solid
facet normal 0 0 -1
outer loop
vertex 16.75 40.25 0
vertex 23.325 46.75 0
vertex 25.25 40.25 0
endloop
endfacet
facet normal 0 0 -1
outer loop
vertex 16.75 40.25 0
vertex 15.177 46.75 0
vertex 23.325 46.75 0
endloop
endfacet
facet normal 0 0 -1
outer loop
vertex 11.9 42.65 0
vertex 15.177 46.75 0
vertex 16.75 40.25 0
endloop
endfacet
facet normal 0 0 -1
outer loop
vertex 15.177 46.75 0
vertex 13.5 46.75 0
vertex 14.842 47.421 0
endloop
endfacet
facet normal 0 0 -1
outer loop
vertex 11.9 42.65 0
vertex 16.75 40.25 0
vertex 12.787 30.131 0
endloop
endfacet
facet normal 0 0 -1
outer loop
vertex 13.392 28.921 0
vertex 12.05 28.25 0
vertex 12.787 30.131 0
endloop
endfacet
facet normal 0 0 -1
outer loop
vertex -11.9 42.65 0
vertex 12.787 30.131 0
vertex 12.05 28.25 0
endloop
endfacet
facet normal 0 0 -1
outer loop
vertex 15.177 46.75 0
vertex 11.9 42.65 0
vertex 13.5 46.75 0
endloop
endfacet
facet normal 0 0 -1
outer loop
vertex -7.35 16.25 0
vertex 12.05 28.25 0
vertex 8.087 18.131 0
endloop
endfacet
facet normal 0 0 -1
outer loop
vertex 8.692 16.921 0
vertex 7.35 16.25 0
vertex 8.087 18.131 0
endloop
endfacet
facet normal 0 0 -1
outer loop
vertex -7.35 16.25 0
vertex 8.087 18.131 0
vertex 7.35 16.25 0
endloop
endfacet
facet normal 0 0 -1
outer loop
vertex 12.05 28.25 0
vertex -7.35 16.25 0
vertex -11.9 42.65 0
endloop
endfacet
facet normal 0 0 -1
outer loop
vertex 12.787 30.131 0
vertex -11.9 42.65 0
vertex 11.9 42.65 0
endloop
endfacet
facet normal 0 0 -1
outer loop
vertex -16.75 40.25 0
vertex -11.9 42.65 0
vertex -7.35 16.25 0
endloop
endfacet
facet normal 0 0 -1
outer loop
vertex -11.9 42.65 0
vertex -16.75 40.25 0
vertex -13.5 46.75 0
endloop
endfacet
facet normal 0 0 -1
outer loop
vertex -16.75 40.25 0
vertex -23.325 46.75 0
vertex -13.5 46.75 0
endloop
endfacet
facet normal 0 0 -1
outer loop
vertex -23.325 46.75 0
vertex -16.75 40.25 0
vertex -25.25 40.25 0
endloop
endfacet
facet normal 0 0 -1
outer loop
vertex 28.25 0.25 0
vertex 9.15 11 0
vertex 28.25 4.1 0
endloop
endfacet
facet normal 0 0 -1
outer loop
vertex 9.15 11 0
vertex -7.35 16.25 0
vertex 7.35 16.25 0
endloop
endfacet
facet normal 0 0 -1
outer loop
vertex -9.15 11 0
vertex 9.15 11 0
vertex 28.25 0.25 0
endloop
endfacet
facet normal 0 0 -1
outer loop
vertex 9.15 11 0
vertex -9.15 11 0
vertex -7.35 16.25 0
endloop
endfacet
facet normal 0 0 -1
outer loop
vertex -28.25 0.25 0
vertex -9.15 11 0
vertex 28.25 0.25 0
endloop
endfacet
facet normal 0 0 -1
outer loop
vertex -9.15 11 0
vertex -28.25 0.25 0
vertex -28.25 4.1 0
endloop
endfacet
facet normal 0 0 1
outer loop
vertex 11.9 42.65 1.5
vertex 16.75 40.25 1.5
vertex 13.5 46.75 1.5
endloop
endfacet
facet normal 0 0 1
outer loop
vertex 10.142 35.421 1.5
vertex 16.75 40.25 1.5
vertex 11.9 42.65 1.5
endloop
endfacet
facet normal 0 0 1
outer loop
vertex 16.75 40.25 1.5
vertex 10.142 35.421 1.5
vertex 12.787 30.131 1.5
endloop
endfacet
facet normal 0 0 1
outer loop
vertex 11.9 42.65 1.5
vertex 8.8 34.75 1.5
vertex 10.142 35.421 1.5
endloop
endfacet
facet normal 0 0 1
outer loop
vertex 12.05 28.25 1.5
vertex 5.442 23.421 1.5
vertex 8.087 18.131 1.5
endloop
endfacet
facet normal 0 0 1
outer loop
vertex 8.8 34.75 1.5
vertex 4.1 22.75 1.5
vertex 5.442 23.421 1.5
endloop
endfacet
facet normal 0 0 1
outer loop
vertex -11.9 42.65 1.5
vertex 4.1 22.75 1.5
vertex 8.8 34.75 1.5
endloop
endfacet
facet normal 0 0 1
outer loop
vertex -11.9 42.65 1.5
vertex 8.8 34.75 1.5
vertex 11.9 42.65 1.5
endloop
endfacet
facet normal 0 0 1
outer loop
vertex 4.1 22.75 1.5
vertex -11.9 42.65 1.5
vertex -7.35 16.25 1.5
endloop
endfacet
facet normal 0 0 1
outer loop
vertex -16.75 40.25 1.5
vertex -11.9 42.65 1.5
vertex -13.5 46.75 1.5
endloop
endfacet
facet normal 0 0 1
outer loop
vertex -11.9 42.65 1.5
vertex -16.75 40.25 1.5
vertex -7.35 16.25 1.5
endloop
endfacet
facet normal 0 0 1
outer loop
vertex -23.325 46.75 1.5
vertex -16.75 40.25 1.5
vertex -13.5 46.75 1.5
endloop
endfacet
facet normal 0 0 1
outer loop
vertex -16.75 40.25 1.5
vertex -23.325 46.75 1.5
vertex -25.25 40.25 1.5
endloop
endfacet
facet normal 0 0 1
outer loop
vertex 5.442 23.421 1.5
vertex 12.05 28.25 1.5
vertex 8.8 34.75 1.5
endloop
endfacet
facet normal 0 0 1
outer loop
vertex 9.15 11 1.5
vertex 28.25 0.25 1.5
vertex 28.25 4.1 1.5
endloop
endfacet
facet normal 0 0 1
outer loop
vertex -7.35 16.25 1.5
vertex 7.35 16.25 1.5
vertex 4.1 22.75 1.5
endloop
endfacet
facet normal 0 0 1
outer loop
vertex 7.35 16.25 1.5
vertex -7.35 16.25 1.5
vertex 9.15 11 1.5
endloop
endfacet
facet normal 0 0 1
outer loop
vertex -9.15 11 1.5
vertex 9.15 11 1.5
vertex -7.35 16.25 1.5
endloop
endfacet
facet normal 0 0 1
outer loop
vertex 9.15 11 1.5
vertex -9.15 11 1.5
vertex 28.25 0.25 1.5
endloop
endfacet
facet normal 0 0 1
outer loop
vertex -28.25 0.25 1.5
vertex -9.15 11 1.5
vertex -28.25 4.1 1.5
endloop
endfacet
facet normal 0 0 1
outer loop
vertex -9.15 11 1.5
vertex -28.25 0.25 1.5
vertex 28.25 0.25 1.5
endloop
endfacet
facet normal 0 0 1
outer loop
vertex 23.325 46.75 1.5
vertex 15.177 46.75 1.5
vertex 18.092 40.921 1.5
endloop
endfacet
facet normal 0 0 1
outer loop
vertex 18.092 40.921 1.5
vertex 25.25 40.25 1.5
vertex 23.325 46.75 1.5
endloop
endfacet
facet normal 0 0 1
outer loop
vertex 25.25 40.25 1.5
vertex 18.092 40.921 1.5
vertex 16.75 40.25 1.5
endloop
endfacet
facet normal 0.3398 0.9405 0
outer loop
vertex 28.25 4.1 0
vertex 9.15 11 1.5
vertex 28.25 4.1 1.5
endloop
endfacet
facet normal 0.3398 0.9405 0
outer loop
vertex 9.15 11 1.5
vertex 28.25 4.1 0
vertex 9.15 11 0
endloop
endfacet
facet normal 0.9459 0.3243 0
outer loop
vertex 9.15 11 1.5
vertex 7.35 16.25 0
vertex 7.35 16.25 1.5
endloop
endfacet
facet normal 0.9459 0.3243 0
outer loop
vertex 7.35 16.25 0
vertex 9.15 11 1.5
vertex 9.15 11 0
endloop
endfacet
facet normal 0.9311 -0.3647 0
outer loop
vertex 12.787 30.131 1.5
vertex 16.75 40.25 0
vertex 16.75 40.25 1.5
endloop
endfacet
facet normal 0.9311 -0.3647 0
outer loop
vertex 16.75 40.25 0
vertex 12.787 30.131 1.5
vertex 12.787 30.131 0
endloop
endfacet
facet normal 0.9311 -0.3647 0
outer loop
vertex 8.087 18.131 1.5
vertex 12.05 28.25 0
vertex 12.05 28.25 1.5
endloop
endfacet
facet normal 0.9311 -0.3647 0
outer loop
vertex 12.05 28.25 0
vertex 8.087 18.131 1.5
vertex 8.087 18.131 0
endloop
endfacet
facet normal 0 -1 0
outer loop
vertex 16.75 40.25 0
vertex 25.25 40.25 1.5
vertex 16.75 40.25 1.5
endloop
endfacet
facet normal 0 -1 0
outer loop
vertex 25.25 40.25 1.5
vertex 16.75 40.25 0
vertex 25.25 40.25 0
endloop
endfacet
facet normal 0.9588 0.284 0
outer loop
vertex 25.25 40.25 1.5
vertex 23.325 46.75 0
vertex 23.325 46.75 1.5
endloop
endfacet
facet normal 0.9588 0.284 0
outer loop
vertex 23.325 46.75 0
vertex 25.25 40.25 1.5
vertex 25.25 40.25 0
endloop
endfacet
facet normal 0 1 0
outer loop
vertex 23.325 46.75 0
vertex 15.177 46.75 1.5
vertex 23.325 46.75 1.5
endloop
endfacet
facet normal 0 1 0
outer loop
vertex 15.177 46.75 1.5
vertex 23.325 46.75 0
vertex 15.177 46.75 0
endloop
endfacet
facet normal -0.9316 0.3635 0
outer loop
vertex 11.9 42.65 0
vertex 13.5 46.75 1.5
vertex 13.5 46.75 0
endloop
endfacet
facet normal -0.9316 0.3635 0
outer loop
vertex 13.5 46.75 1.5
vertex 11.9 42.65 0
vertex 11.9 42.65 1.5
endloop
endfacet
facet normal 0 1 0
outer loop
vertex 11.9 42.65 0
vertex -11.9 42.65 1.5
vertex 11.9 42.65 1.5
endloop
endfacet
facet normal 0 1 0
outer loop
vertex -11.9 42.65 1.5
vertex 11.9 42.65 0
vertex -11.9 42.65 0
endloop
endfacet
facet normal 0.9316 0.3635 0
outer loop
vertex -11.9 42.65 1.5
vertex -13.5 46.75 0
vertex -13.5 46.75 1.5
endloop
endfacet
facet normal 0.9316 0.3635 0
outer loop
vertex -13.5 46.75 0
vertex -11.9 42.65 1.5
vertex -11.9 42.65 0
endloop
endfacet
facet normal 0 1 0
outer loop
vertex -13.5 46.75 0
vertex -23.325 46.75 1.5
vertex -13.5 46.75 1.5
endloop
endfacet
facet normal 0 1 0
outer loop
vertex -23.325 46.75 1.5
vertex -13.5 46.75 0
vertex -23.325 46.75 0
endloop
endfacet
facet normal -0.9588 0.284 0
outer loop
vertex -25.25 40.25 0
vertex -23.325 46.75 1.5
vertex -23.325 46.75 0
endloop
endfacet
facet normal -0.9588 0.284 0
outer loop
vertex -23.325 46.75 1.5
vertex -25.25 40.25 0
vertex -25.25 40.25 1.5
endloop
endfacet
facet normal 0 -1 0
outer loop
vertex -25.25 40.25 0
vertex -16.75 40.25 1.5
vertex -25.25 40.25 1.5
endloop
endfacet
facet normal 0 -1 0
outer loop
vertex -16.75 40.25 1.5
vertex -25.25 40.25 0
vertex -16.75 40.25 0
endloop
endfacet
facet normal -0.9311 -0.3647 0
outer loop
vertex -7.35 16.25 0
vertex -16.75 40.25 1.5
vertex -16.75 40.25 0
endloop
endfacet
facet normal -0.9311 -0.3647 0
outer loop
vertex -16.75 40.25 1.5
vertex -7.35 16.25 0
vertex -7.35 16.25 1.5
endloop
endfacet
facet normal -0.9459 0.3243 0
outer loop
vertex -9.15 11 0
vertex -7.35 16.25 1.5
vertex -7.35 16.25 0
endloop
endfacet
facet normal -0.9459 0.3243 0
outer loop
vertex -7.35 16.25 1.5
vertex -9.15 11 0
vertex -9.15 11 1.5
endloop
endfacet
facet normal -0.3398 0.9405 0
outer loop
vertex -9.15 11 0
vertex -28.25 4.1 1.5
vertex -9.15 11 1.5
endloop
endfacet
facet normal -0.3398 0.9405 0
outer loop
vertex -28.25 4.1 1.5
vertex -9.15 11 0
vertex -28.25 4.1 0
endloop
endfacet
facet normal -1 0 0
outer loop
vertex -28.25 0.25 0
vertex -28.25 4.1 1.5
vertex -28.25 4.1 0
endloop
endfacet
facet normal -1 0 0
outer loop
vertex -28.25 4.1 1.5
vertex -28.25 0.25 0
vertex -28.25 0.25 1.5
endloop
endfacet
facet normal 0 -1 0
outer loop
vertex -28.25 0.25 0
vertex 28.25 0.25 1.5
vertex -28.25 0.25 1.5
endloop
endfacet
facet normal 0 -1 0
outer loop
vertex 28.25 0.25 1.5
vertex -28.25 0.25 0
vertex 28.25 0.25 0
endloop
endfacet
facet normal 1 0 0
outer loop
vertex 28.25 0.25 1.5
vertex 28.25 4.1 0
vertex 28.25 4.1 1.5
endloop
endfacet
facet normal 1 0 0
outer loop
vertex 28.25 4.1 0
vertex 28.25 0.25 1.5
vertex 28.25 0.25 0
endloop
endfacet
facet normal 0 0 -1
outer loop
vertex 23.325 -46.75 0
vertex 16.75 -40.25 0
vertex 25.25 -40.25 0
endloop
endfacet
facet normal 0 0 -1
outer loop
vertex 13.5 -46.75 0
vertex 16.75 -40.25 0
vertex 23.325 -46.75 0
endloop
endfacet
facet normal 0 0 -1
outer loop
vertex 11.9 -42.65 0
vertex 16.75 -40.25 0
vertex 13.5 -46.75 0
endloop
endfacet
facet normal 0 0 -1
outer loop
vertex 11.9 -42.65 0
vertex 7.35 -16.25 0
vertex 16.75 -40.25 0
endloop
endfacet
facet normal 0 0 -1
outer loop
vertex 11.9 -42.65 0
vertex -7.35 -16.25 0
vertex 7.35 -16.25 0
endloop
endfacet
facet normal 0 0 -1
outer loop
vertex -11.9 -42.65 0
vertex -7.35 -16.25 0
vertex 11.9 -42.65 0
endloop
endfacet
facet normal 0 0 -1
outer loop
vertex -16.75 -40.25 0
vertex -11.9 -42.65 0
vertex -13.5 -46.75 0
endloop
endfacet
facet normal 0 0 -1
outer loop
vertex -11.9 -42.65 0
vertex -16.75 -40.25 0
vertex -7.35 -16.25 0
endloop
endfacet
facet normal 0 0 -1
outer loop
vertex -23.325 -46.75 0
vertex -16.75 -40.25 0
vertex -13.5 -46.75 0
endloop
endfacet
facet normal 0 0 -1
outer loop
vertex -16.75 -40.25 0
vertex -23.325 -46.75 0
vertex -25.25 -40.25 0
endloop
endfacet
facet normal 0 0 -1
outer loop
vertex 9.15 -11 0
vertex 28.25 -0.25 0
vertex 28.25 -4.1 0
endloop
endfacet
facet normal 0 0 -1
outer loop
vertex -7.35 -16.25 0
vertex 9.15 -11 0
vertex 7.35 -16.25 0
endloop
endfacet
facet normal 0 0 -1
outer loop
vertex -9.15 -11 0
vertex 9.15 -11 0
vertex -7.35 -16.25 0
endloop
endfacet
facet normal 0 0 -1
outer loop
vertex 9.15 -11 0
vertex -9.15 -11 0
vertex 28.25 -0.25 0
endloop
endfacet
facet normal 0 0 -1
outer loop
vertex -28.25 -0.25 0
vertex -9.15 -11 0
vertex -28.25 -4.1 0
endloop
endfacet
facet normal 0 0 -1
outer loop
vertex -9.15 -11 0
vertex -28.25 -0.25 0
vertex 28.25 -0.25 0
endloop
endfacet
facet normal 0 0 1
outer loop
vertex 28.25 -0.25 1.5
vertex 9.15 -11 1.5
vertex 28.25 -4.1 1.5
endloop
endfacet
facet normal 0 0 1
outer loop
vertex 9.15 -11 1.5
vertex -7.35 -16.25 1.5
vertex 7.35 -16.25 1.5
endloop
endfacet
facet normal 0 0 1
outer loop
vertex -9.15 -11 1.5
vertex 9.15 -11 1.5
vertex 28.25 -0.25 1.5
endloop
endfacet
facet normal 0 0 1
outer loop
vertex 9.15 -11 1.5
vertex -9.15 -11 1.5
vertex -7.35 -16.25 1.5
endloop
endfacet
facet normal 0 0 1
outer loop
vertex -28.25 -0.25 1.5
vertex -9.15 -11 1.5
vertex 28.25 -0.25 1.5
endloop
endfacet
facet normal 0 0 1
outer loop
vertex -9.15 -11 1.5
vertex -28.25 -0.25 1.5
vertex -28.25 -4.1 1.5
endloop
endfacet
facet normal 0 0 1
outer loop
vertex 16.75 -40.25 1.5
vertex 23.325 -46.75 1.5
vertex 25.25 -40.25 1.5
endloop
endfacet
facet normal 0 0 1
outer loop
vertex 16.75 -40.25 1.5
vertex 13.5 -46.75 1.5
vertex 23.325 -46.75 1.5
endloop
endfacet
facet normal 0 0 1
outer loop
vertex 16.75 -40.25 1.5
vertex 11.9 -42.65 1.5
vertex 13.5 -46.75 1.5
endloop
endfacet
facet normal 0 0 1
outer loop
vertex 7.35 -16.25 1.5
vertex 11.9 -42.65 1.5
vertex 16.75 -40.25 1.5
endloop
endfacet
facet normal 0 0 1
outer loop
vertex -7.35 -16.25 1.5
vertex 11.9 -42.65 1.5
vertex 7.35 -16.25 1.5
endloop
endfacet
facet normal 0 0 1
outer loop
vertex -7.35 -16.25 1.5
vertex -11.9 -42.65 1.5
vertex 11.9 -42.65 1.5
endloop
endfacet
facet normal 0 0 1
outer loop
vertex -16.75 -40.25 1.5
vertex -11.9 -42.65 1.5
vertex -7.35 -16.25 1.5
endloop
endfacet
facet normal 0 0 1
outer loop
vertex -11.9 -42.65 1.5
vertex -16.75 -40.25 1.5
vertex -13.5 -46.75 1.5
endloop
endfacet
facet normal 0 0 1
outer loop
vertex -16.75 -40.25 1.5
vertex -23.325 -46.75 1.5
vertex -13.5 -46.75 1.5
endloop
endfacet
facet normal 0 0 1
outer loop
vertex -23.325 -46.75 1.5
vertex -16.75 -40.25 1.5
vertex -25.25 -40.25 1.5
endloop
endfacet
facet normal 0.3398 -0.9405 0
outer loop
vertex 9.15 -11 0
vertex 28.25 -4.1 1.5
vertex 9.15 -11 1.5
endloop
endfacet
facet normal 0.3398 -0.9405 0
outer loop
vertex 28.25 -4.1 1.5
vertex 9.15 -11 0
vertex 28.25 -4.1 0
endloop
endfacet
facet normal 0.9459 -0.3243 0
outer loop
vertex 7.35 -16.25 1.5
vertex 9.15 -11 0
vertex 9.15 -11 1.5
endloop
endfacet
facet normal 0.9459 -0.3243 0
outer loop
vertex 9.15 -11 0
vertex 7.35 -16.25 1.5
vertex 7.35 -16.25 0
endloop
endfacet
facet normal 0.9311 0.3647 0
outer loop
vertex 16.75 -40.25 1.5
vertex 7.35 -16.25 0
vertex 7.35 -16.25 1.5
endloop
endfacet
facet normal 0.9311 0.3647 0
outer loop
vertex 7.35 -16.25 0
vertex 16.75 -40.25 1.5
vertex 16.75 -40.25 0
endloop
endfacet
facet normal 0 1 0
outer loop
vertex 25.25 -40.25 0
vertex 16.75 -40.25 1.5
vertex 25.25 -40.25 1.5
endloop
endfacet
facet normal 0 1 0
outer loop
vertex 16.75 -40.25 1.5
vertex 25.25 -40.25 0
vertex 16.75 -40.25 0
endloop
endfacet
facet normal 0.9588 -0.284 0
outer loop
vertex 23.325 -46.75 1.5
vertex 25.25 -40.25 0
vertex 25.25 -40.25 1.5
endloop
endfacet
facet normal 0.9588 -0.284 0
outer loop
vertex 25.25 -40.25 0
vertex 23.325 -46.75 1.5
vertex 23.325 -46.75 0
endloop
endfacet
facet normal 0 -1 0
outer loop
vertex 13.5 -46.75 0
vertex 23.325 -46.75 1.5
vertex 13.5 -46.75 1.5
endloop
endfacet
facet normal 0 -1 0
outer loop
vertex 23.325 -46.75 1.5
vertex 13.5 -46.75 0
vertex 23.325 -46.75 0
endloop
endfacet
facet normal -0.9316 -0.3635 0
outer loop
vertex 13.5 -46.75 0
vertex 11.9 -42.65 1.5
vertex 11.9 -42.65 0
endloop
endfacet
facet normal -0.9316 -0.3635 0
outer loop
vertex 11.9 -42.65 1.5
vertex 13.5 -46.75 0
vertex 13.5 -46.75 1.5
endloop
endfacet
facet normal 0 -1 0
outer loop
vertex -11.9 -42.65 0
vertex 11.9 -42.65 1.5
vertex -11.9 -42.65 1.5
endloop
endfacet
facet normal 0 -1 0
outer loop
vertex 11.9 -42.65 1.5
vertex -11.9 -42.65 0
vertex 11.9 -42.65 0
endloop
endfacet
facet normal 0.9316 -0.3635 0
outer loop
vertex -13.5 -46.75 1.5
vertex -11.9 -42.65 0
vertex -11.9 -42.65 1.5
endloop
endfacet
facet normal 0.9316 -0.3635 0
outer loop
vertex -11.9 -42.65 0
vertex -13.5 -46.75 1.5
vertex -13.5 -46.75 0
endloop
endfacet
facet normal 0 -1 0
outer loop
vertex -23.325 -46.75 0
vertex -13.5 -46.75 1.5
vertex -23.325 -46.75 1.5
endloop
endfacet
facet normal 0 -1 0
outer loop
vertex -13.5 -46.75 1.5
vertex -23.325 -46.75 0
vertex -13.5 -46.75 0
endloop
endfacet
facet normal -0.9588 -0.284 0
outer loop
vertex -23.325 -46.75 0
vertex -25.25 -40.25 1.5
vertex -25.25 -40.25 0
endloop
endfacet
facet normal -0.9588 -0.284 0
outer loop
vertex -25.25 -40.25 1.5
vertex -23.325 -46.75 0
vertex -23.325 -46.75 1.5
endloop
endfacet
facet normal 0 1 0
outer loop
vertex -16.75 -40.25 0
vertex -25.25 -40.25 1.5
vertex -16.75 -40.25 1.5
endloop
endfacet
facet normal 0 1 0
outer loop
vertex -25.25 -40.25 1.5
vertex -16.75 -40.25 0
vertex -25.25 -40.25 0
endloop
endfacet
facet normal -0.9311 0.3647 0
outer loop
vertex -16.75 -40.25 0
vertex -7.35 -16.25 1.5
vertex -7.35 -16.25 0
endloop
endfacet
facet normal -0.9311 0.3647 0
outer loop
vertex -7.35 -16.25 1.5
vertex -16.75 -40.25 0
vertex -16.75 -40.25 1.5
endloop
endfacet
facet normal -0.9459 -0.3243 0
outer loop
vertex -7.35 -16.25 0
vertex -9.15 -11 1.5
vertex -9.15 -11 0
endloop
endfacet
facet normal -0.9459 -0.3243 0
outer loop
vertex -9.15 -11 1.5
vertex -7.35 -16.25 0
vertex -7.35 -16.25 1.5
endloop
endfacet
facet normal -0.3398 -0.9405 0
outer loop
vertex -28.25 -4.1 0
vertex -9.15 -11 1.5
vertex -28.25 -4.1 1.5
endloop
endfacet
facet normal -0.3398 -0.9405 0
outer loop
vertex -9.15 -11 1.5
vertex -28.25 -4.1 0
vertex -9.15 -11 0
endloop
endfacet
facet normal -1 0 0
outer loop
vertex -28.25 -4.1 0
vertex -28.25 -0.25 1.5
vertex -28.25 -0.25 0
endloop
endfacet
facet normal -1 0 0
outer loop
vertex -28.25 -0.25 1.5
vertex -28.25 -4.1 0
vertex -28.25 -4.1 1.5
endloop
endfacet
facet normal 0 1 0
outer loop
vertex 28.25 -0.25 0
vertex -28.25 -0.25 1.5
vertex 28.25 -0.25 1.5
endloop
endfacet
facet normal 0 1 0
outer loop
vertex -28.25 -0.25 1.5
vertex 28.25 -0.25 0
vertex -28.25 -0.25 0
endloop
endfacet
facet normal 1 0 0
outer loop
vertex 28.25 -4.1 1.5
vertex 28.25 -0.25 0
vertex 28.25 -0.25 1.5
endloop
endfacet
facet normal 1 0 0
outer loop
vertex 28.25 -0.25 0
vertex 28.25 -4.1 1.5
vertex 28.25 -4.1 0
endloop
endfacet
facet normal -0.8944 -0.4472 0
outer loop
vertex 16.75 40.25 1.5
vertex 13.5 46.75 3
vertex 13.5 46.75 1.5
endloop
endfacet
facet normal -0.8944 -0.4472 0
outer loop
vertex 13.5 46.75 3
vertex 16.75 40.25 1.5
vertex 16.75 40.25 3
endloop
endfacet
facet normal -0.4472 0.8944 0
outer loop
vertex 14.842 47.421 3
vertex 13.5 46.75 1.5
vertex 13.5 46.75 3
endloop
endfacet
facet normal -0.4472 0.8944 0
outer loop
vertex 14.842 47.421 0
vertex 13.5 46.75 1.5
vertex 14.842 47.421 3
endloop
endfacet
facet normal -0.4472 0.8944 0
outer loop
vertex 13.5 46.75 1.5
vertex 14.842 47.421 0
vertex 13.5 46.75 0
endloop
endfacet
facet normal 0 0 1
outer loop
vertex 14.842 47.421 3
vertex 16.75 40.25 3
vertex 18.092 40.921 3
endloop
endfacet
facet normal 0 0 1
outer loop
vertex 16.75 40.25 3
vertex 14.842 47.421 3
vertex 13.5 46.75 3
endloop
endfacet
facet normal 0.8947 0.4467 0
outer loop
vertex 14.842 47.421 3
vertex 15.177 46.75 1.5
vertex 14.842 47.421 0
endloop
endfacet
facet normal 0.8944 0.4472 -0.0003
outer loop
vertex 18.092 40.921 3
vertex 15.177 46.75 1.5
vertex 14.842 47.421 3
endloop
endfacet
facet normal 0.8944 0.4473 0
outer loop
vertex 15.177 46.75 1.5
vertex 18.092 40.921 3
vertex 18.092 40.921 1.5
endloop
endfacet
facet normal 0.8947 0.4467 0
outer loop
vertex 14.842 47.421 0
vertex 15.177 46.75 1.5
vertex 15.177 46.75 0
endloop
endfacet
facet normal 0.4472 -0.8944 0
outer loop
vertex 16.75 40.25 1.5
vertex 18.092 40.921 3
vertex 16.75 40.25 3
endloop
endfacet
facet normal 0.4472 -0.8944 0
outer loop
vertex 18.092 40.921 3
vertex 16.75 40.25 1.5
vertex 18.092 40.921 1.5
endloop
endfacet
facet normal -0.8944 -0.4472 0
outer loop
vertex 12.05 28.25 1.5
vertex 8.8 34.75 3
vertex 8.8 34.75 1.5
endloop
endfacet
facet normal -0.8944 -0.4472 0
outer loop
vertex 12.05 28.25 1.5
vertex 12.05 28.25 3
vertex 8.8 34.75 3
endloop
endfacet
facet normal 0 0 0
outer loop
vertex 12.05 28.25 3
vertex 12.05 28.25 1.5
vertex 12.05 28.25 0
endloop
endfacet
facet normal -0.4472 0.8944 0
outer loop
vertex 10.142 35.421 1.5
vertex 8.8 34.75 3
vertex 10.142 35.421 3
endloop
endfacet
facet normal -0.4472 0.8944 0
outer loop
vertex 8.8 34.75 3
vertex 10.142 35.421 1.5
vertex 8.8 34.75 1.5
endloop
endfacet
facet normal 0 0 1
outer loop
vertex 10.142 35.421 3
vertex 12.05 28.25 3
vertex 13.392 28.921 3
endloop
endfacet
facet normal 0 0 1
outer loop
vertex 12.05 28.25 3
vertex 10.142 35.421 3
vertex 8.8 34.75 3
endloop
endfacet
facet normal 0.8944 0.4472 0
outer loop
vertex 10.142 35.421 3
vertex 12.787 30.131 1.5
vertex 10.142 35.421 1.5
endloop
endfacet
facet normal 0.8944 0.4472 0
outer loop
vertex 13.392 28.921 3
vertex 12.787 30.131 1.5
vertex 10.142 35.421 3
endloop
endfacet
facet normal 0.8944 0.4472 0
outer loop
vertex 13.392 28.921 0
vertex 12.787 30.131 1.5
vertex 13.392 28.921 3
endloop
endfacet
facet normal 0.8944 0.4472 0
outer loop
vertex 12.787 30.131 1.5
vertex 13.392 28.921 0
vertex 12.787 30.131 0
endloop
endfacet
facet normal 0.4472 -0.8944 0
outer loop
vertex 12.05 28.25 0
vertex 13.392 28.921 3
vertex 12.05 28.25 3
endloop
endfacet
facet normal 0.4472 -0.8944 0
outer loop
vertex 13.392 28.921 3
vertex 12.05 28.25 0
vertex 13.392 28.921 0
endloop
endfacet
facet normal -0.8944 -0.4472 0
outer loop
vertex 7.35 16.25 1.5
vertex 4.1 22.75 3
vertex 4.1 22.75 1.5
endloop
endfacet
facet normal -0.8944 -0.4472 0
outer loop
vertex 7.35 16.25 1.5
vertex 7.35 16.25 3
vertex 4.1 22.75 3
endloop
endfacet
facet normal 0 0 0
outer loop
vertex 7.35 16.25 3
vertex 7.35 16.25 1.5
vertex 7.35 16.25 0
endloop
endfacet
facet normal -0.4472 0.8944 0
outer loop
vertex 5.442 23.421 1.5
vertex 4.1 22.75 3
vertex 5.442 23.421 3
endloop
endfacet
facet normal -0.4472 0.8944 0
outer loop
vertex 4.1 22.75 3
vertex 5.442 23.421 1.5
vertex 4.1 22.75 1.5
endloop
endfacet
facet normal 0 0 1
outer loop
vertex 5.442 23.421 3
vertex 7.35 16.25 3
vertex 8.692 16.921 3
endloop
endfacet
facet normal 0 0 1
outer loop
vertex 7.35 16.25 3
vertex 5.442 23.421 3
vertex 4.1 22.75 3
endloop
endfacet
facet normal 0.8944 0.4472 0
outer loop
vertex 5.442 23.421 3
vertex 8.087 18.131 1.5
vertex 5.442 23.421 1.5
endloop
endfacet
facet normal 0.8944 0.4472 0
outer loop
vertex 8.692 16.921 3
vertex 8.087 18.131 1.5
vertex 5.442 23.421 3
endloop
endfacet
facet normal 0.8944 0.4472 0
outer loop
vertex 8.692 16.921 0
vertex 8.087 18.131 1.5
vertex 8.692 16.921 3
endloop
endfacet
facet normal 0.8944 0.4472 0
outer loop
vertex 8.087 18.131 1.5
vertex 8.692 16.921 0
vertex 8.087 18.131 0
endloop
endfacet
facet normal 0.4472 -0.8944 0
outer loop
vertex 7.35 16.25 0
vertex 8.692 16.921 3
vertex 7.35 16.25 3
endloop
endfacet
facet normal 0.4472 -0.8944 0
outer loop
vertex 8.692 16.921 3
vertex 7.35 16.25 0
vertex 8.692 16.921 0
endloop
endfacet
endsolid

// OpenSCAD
/* [Dimensions] */
ovDims=[56.5,46.5,33.75];
    //   0         1         2       3     4     5     6         7         8
heights=[0       , 3.85,     10.75,  16,   40,   40,   ovDims.y, ovDims.y, 42.4];
widths= [ovDims.x, ovDims.x, 18.3,   14.7, 33.5, 50.5, 46.65,    27,       23.8        ]; //from top to bottom
bdyThck=3;
gap=0.5;
hingeThck=0.2;

/* [FinDimensions] */
finThck=1.5;


/* [Hidden] */
//body shape
bdyPoly=[for (i=[0:len(heights)-1]) [widths[i]/2,heights[i]],
      for (i=[1:len(heights)]) [-widths[len(heights)-i]/2,heights[len(heights)-i]]
      ];
      
//the side where the fins are attached
sideLen=norm([widths[4]/2,heights[4]]-[widths[3]/2,heights[3]]);
sideAng=atan2((widths[4]-widths[3])/2,heights[4]-heights[3]);


//fins
finAng=atan2((widths[4]-widths[7])/2,heights[7]-heights[4]); //tan(alpha)=x/y
finWdth=sqrt(pow((widths[4]-widths[7])/2,2)+pow(heights[7]-heights[4],2));
finPos=[[widths[4]/2,heights[4],0],
        [widths[3]/2+sideLen/2*cos(90-sideAng),heights[3]+sideLen/2*sin(90-sideAng)],
        [widths[3]/2,heights[3]]];
        

finPoly=[];
  

for (im=[0,1])
  mirror([0,im]) translate([0,gap/2,0])
    linear_extrude(bdyThck/2) polygon(bdyPoly);

//front fins (same length)
#for (pos=finPos)
  translate(pos+[0,+gap/2,0]) rotate(finAng)  linear_extrude(3) translate([finThck/2,finWdth/2]) square([finThck,finWdth],true);

module fins(){
    
}
 
 
